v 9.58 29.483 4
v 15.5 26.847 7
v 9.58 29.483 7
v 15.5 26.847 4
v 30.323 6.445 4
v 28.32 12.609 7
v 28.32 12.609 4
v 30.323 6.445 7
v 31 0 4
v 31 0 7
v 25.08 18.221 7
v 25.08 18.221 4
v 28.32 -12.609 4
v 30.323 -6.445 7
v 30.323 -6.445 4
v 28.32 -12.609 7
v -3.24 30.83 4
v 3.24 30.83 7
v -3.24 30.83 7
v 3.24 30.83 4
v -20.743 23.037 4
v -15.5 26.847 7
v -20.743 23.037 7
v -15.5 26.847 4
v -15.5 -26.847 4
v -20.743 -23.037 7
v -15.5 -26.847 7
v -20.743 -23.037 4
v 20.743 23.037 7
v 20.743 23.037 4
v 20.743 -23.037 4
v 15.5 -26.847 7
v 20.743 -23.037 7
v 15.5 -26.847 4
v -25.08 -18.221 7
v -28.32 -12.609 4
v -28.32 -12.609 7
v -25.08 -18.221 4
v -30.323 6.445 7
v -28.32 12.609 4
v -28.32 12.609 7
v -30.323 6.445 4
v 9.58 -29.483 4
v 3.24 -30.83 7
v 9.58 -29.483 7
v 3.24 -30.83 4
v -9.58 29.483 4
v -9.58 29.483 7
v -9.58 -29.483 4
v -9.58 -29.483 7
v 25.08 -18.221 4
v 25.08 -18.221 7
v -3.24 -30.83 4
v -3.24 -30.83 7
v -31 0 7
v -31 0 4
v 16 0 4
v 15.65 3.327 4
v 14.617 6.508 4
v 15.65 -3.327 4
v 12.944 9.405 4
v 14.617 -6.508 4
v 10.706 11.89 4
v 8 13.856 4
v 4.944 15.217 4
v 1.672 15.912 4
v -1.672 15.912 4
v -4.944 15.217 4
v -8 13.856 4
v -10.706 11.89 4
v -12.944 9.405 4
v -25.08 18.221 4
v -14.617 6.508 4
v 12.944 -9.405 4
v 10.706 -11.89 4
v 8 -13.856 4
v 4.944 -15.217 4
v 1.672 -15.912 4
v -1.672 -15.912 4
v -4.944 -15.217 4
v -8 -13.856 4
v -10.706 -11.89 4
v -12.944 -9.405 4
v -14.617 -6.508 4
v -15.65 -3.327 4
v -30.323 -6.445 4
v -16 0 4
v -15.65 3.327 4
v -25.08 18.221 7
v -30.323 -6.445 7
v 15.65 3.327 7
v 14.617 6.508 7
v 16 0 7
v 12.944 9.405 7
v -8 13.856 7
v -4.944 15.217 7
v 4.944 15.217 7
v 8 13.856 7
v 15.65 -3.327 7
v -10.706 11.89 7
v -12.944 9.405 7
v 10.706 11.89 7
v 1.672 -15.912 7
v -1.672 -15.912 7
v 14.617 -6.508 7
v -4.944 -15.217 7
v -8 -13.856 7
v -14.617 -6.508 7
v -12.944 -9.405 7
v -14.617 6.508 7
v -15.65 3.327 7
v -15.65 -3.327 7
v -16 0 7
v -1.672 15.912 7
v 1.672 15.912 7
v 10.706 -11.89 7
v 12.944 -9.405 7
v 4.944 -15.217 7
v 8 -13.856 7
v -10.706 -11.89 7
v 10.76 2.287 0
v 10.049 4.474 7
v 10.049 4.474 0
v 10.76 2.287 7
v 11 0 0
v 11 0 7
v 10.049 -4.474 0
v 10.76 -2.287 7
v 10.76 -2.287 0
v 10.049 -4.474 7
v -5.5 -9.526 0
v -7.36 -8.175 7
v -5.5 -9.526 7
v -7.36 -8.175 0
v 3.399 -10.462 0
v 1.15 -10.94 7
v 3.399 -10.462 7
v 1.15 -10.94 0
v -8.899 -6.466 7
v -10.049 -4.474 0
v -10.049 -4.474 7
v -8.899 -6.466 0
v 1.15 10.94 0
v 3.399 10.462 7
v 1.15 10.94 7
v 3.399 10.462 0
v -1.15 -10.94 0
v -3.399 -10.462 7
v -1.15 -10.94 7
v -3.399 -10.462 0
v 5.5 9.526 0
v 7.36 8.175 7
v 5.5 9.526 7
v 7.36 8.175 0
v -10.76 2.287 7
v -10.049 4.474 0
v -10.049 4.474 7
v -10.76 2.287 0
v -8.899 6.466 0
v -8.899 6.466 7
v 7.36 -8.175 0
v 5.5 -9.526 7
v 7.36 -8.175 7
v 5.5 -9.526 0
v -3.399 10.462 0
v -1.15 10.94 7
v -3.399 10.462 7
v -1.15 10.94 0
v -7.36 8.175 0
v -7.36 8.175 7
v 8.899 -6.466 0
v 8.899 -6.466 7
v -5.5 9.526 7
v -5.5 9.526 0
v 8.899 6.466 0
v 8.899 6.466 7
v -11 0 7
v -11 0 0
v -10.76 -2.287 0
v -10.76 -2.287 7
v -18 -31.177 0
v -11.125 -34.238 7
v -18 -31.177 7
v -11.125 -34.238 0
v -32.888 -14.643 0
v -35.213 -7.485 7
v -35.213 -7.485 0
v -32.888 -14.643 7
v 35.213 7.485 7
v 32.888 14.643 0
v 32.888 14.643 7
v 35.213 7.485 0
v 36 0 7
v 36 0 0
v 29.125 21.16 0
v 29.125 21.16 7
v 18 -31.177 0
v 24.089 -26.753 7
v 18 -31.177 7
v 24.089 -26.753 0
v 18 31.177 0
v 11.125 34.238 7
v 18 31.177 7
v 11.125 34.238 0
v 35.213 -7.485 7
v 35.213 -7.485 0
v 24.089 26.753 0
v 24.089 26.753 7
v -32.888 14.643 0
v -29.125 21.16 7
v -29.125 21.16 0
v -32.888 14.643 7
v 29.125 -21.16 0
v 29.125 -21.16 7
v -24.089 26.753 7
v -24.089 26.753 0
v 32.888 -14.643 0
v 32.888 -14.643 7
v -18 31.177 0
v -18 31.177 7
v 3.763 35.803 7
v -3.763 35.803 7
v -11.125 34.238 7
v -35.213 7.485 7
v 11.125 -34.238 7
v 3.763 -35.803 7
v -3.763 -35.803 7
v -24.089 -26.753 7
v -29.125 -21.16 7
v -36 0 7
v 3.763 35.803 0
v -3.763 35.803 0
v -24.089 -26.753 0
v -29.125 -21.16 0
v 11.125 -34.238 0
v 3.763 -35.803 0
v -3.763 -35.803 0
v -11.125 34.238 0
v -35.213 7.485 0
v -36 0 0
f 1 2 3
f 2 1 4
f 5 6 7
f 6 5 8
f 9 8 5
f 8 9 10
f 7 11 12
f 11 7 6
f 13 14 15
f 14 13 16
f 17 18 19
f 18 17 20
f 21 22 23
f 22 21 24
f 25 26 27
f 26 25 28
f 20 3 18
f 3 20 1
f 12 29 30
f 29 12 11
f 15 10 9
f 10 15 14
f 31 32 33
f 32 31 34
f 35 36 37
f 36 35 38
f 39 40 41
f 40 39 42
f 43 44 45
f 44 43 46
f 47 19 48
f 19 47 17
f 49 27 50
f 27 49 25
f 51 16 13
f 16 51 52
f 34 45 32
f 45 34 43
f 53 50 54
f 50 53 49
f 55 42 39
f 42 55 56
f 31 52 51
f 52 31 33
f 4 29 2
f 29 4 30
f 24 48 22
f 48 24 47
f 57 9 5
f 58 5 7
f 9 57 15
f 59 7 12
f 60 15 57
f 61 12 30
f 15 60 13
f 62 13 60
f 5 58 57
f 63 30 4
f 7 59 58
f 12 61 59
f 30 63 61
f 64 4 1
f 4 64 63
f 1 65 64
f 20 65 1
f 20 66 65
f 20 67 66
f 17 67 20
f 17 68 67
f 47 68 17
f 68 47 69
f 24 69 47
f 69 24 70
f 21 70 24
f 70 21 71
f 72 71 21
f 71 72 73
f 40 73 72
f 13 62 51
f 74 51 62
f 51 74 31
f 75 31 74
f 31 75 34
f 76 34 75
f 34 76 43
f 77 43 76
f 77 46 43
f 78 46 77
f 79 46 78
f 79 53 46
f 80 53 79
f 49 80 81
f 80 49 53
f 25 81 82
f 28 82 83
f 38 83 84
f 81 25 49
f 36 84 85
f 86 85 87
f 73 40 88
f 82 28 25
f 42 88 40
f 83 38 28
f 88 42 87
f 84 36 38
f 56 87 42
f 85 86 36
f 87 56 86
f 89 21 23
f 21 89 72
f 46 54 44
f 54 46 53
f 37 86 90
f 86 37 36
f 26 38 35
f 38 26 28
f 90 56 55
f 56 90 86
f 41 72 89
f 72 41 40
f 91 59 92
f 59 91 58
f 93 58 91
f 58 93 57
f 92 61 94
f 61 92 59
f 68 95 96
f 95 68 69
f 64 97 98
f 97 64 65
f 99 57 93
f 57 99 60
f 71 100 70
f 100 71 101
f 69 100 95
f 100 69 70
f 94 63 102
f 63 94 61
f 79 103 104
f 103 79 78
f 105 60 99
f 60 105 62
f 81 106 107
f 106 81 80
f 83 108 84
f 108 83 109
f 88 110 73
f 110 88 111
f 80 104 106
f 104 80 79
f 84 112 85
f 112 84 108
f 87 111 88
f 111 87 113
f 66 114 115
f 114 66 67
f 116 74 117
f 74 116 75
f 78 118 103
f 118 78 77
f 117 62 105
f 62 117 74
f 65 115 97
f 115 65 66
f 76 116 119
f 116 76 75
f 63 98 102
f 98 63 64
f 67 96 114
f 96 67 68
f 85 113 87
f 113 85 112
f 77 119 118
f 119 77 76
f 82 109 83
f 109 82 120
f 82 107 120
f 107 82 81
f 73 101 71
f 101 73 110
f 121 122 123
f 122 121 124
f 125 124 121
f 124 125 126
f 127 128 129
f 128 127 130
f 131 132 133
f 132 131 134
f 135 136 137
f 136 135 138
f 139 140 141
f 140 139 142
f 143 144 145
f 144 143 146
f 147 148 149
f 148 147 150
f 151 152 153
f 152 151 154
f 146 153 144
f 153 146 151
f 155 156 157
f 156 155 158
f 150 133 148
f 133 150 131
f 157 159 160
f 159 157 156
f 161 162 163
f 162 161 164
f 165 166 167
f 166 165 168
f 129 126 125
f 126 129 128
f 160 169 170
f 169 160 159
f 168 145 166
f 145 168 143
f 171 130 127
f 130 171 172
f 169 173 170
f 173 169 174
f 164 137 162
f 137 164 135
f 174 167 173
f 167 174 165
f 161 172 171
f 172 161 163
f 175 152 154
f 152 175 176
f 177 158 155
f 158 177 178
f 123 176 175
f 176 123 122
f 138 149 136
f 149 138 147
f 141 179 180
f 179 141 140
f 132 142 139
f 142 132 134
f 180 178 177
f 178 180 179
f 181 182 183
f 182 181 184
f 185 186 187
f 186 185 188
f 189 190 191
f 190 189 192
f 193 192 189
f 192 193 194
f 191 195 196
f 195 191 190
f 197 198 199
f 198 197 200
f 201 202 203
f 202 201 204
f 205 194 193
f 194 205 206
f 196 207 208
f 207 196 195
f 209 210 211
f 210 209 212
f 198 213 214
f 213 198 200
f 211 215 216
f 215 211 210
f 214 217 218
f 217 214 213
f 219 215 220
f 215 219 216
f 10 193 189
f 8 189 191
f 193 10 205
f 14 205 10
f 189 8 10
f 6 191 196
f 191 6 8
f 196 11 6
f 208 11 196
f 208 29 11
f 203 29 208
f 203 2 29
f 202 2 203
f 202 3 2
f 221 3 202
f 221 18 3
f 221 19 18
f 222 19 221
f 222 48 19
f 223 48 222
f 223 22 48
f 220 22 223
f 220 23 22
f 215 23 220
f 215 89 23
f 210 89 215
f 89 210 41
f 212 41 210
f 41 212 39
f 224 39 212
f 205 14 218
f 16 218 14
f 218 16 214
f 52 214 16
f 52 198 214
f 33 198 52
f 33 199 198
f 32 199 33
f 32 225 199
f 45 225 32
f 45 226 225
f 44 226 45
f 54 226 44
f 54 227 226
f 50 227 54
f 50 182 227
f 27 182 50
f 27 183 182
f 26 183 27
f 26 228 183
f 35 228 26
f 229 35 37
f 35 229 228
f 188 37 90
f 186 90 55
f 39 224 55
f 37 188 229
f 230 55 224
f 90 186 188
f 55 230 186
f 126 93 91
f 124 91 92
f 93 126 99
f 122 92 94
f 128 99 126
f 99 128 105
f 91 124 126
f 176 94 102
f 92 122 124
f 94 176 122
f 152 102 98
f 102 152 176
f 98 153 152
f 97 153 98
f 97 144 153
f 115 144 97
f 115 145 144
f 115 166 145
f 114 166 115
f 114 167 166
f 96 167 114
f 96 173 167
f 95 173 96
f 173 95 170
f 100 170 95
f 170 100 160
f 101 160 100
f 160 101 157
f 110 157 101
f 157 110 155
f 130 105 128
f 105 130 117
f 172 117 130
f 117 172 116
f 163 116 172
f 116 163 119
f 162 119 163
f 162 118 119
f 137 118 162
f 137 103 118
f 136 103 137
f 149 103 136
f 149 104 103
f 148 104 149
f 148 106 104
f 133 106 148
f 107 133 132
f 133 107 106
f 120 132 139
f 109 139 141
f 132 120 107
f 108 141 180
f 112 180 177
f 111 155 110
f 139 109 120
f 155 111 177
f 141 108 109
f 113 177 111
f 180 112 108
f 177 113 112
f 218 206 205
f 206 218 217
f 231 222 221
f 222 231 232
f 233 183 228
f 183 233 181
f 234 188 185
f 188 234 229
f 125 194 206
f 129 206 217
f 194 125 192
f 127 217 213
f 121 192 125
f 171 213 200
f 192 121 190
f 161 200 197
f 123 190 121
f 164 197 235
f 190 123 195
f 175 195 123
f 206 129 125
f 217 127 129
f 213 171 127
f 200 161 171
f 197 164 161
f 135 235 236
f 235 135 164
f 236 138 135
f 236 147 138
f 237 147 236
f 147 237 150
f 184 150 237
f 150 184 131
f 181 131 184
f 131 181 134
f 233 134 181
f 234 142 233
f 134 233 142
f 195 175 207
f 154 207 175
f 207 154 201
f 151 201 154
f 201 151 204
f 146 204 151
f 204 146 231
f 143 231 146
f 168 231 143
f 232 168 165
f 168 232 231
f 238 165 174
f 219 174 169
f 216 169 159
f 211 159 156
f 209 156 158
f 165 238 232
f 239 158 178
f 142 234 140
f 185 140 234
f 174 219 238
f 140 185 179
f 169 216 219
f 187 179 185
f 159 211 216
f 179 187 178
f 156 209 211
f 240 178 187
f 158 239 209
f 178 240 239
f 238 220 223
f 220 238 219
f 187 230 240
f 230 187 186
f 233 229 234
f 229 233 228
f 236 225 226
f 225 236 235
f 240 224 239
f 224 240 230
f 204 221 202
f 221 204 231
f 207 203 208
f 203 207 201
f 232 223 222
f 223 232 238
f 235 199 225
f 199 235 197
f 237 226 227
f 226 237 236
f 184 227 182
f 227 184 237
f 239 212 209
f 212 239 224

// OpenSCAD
d=72;
w=5;
h=7;
shaft_d=22;
shaft_w=5;
t=4;
difference(){
	cylinder(r=d/2,h=h);
	union(){
		cylinder(r=shaft_d/2,h=h*3,center=true);
		translate([0,0,t]) difference(){
			cylinder(r=d/2-w,h=h);
			cylinder(r=shaft_d/2+shaft_w,h=h);
		}
	}
}
